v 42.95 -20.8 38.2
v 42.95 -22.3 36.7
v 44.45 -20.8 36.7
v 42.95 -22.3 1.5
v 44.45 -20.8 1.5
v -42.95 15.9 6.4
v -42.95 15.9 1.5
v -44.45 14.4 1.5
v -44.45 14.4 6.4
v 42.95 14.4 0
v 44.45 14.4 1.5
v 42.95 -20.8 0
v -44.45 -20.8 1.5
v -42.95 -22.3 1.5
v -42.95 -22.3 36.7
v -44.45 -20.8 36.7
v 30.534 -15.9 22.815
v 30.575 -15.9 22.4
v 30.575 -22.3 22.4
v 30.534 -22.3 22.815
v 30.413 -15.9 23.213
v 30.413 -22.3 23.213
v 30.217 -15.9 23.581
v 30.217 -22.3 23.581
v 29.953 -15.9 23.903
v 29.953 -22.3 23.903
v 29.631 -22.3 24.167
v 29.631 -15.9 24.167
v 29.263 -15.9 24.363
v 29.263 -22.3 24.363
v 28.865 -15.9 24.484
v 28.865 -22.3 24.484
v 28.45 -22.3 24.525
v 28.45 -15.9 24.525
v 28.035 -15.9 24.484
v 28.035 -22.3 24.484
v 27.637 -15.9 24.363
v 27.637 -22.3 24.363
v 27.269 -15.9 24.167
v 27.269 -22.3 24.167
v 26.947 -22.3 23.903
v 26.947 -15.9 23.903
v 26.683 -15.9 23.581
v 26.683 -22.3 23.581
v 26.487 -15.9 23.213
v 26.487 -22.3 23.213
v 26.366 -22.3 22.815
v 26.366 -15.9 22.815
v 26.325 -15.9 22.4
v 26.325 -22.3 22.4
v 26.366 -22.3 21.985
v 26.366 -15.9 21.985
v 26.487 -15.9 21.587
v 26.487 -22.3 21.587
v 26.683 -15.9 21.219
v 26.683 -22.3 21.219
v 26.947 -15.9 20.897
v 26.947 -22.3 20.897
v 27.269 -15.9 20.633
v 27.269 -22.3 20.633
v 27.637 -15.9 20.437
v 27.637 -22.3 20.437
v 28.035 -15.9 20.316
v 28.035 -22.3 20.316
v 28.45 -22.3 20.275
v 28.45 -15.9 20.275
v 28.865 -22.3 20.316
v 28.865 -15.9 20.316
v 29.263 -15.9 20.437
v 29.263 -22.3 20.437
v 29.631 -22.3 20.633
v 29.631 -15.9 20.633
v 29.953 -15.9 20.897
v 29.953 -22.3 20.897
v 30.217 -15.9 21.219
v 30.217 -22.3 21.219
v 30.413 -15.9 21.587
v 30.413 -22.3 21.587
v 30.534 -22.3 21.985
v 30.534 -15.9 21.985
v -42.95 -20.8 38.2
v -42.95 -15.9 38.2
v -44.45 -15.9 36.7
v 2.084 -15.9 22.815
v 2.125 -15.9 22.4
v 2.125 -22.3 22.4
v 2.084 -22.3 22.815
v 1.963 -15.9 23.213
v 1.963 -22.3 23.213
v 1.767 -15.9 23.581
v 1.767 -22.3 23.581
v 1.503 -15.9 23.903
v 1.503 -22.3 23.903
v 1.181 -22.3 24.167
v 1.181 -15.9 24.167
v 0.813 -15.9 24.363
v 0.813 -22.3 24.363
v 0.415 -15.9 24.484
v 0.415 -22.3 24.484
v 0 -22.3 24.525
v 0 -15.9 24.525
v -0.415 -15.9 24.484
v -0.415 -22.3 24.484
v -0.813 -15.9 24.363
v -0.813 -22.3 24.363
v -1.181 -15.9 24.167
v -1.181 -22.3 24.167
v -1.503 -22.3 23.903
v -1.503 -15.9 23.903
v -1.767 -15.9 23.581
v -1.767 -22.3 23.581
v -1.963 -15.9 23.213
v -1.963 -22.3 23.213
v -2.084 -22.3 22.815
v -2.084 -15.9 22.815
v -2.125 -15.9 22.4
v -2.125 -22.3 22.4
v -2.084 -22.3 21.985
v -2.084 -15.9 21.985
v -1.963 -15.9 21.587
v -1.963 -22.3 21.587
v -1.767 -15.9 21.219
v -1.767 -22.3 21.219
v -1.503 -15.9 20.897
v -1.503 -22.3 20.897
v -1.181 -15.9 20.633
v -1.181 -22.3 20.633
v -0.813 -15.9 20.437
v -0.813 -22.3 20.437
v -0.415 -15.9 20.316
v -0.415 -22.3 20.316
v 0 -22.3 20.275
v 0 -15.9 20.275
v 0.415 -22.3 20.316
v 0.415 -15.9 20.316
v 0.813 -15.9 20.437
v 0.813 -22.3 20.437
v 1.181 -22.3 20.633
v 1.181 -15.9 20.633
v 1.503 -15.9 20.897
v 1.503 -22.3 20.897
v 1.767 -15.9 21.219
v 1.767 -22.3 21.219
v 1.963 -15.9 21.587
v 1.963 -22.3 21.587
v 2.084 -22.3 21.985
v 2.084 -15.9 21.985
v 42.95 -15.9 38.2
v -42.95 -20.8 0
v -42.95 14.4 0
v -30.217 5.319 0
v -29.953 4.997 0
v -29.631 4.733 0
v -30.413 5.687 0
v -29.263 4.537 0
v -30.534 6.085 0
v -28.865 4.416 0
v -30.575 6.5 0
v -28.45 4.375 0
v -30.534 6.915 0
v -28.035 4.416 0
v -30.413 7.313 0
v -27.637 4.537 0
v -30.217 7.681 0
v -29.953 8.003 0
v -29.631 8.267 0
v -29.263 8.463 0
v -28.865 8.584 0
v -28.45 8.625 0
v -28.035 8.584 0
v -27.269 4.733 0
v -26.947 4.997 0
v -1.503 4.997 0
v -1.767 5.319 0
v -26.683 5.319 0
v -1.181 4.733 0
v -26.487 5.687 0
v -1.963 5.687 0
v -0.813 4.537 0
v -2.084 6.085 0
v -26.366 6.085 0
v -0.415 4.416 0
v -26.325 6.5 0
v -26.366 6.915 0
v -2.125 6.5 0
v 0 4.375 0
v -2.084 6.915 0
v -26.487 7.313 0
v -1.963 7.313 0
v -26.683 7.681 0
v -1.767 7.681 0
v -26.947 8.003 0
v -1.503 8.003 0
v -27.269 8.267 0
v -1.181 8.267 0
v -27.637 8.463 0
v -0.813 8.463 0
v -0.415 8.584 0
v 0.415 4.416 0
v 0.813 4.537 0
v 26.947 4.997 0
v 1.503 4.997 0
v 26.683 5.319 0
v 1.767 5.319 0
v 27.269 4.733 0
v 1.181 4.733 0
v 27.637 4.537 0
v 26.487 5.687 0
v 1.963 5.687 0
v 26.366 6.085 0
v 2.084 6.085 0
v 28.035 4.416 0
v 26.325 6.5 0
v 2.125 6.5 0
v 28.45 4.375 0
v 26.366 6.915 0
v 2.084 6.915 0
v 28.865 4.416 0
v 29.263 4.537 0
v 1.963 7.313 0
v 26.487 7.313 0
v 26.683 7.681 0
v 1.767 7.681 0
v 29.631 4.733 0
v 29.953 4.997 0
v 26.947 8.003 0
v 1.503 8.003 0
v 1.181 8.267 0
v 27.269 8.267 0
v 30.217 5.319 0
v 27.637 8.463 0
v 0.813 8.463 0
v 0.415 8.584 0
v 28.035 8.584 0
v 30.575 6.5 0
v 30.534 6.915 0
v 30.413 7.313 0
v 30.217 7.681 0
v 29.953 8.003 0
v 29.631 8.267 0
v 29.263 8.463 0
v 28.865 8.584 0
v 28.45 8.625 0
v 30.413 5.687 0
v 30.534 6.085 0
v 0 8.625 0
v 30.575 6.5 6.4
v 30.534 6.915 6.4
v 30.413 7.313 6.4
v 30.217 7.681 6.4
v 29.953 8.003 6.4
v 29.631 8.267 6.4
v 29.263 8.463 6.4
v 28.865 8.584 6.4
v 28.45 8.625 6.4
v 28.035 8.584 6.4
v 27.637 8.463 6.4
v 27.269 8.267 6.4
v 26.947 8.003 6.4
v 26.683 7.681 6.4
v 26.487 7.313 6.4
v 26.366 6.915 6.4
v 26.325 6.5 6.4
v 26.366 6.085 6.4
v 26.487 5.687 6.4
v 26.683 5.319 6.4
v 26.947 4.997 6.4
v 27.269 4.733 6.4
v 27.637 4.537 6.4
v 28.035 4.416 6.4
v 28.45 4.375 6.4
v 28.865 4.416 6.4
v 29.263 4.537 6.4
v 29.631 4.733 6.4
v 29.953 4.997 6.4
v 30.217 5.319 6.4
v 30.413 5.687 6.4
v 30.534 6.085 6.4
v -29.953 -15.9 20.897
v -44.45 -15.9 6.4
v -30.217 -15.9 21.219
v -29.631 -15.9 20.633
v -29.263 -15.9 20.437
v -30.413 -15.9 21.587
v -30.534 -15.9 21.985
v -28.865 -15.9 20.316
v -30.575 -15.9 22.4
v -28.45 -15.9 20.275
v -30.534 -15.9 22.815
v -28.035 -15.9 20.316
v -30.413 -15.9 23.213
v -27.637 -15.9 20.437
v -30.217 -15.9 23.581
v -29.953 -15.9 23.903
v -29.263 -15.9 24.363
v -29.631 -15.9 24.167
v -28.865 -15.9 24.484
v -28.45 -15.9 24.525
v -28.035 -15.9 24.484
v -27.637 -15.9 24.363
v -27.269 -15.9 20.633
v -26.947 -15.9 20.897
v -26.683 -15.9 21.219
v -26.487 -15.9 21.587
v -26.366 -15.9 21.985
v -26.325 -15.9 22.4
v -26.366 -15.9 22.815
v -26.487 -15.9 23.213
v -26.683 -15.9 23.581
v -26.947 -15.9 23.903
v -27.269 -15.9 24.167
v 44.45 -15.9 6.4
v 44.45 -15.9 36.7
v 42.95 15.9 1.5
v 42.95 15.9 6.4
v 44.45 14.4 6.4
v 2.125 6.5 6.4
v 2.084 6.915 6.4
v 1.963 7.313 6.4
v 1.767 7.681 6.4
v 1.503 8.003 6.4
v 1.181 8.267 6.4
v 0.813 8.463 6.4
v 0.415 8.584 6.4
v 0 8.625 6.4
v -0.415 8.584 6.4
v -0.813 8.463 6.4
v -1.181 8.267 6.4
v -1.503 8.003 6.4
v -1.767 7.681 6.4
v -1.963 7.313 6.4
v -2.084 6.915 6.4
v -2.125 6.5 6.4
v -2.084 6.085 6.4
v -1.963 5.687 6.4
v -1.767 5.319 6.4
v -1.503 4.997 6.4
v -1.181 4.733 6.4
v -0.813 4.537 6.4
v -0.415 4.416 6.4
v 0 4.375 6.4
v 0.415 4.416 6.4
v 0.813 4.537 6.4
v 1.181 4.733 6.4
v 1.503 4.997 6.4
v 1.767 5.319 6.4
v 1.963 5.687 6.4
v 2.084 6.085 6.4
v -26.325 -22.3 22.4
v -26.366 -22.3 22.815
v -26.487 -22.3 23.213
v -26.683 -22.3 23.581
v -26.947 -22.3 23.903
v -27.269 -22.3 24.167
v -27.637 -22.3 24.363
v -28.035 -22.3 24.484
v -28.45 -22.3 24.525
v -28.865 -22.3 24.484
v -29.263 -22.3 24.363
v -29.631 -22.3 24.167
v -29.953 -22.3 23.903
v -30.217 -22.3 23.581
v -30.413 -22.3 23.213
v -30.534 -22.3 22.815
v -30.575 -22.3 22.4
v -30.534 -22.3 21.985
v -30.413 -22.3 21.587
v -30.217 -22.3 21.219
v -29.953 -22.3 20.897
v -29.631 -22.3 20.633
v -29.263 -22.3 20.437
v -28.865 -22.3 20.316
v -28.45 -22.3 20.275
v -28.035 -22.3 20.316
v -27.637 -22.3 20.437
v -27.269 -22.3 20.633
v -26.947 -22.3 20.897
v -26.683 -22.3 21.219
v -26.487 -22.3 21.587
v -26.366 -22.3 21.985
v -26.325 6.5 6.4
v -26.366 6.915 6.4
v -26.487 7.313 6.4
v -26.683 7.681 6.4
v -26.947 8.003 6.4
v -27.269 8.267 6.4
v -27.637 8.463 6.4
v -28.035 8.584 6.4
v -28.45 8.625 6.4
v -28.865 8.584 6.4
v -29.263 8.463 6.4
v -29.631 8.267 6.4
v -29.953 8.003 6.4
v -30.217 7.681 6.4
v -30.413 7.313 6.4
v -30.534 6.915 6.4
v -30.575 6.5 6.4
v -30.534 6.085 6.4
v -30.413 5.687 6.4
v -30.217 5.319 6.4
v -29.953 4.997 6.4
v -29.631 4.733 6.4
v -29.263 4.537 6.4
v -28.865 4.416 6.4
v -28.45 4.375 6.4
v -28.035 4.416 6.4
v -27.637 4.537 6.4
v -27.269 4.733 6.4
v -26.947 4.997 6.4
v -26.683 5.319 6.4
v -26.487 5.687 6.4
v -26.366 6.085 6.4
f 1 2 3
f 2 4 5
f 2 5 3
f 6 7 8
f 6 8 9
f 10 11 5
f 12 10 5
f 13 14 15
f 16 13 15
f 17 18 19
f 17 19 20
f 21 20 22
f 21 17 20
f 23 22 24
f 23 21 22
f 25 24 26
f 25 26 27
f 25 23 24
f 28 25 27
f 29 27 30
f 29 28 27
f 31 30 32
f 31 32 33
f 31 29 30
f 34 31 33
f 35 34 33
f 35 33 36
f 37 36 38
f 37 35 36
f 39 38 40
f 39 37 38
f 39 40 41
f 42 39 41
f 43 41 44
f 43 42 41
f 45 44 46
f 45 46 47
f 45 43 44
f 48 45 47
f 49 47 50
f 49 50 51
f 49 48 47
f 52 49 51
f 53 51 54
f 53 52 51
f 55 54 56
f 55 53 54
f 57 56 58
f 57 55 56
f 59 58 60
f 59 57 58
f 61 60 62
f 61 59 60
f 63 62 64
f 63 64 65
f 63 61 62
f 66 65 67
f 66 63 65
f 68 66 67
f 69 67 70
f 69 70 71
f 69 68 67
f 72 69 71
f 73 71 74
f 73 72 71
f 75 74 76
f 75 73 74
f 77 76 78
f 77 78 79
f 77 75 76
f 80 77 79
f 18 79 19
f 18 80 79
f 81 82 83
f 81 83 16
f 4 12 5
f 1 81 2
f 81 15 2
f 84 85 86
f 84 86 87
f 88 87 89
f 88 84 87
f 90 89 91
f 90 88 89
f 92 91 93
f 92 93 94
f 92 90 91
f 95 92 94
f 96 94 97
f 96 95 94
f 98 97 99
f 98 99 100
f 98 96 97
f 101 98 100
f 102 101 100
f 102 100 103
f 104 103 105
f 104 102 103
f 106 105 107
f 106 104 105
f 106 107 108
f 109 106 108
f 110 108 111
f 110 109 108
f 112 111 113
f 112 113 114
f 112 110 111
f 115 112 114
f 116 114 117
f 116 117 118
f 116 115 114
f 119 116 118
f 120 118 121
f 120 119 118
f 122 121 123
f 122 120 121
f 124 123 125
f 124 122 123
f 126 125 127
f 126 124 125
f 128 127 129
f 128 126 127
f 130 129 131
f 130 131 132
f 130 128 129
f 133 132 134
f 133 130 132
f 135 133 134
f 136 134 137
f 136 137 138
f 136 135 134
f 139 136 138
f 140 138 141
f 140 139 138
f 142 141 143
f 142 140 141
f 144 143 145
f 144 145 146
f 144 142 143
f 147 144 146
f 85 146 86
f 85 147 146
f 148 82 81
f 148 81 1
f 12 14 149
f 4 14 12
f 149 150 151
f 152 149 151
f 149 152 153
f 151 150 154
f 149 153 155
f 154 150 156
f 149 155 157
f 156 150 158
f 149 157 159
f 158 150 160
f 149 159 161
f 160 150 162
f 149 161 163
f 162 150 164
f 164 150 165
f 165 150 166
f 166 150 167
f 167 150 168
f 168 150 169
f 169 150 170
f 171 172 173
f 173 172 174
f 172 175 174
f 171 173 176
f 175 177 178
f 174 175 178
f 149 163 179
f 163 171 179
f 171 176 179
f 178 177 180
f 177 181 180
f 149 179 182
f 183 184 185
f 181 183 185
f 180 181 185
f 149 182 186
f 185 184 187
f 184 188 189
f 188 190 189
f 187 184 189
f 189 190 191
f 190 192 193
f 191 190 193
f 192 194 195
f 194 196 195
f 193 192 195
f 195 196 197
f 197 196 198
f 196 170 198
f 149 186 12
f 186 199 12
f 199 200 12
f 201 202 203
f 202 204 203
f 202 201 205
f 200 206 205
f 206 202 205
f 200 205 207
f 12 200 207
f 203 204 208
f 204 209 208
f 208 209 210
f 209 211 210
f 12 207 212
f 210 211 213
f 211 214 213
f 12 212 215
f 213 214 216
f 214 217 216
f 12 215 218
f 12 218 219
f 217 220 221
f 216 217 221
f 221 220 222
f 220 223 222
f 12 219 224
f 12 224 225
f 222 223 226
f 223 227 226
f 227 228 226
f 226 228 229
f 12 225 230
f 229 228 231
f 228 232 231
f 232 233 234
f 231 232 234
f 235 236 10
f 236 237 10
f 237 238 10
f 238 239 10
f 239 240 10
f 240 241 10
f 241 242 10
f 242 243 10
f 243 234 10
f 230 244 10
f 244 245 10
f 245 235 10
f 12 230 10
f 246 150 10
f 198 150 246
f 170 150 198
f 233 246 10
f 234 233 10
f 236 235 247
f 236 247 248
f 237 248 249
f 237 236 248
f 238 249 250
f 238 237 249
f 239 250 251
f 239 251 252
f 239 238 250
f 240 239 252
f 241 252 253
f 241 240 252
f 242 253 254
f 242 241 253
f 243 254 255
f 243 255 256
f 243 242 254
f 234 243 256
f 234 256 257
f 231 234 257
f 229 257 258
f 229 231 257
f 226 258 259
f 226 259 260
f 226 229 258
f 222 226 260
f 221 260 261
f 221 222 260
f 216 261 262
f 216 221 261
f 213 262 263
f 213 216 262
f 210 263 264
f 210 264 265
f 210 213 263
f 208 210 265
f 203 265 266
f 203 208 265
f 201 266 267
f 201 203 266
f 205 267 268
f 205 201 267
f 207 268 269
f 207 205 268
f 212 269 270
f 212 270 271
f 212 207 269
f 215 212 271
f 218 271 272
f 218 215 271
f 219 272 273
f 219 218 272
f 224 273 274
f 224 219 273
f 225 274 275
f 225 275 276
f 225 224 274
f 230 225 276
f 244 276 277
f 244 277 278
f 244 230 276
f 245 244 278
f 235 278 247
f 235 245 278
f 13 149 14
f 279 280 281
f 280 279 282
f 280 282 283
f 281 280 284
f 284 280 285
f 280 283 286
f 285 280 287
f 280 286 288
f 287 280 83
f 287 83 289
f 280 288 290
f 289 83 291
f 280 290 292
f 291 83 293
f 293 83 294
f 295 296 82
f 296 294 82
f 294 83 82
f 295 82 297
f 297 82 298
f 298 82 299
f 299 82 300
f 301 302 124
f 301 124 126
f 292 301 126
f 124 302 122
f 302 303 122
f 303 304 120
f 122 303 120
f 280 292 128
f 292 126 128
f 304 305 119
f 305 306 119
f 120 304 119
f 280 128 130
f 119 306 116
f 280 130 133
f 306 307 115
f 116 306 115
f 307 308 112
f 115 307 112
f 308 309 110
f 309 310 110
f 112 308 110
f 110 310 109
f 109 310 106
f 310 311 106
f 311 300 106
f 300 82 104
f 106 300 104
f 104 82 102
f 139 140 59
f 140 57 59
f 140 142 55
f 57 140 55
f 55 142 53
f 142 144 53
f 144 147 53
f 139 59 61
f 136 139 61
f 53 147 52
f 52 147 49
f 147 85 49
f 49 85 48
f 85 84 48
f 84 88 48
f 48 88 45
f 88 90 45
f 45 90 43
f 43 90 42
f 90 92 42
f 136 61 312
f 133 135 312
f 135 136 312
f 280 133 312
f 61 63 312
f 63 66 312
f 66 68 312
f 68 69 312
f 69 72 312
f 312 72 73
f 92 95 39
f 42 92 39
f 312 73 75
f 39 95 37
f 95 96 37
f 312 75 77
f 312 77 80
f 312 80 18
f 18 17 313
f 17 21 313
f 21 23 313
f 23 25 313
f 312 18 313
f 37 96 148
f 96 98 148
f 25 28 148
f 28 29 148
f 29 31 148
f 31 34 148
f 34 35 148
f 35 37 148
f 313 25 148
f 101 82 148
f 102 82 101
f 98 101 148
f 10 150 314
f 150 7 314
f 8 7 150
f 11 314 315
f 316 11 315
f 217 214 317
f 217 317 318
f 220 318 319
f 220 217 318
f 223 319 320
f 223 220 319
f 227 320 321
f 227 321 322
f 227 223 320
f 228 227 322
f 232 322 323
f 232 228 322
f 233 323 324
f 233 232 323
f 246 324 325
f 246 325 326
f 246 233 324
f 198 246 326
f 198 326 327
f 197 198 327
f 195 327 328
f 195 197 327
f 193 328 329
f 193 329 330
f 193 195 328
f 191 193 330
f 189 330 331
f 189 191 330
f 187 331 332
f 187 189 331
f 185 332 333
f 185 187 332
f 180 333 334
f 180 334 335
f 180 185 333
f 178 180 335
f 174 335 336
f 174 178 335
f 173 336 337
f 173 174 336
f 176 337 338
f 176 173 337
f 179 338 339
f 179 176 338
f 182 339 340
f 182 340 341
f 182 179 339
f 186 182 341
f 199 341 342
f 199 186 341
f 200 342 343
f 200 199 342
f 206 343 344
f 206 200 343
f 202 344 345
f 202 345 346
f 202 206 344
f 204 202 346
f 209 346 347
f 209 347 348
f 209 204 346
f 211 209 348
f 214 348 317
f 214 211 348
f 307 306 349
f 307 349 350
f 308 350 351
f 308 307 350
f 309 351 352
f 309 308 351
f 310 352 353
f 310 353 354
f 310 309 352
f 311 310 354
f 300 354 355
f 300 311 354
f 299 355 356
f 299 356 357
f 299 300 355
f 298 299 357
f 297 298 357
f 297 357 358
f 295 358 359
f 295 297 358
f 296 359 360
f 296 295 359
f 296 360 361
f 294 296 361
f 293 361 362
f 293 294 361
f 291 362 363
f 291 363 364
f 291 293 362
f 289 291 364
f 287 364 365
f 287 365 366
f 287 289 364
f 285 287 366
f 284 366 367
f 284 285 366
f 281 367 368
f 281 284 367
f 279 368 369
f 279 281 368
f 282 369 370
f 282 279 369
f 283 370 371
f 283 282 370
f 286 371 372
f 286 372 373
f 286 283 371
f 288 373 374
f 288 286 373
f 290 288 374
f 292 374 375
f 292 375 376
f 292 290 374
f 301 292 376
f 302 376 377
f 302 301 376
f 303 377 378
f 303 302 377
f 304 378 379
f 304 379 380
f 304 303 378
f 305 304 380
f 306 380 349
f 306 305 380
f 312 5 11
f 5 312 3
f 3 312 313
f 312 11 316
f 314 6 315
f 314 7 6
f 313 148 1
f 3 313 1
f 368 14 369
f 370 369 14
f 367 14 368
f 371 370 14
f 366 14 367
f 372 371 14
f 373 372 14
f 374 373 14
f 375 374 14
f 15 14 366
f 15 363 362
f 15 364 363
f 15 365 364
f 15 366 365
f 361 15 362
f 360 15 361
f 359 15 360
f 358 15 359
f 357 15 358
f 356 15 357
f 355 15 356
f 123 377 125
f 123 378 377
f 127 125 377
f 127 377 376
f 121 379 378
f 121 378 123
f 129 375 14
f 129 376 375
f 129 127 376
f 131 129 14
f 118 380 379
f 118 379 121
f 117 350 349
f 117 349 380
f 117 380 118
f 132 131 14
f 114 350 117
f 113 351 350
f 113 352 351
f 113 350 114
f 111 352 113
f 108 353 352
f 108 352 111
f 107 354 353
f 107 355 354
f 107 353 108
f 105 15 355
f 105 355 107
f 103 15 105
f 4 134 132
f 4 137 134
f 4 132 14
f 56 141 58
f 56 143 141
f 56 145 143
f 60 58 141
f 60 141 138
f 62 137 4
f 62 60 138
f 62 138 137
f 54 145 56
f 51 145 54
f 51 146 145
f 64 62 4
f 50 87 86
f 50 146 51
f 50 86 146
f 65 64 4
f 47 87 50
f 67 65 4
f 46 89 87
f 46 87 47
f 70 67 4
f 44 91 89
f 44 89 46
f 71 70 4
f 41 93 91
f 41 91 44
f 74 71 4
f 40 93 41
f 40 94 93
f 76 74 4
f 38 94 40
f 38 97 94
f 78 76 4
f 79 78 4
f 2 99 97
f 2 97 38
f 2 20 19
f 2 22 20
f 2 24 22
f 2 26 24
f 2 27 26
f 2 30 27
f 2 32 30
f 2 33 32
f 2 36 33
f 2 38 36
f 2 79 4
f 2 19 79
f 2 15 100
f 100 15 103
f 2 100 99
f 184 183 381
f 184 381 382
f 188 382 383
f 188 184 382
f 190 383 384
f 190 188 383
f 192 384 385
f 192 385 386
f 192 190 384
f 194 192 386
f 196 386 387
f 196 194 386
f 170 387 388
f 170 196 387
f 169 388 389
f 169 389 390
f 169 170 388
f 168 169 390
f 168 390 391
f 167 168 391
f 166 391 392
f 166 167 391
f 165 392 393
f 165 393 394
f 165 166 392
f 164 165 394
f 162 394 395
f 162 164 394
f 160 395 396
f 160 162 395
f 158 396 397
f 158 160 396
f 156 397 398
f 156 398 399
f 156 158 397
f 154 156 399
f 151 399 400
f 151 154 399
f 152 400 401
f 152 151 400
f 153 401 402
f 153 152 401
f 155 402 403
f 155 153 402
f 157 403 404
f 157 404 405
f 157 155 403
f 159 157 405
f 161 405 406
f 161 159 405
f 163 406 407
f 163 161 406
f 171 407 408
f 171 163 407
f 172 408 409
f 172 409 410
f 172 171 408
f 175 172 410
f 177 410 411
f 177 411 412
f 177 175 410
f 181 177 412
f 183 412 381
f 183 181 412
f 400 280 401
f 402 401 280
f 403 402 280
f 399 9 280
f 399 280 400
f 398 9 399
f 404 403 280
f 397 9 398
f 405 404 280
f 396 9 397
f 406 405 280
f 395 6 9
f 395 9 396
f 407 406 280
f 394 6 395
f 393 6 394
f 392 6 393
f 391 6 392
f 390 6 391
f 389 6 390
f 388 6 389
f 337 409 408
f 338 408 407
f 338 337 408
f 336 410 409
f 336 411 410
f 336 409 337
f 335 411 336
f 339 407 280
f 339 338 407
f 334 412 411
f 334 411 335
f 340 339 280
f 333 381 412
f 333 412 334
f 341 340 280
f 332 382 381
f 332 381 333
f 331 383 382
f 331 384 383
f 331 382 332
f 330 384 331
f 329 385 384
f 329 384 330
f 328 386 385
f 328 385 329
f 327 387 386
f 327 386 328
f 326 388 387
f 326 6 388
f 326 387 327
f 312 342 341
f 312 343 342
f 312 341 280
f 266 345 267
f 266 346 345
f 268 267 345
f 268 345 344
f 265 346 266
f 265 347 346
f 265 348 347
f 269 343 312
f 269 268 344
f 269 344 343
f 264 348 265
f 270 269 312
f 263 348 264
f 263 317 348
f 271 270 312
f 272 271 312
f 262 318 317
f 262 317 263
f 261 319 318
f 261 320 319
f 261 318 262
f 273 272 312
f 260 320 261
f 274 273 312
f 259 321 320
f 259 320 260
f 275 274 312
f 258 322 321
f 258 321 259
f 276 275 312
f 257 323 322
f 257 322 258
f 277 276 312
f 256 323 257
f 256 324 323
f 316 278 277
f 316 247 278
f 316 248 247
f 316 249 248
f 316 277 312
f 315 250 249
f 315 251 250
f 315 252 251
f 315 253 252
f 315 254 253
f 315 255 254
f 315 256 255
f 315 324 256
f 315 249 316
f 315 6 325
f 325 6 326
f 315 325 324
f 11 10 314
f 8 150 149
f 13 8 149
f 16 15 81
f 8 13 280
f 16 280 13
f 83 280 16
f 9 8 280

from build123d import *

# Parameters (mm, degrees)
F0_W     = 88.9
F0_H     = 31.8
F0_R     = 2.125
F1_DEPTH = 6.4
F2_W     = 88.9
F2_H     = 38.2
F2_R     = 2.125
F3_DEPTH = 6.4
F4_SIZE  = 1.5


with BuildPart() as f1:
    # F0 (on Top) → F1 (new body)
    with BuildSketch(Plane.XY):
        Rectangle(F0_W, F0_H)
        with Locations((-28.45, 6.5)):
            Circle(F0_R, mode=Mode.SUBTRACT)
        with Locations((0, 6.5)):
            Circle(F0_R, mode=Mode.SUBTRACT)
        with Locations((28.45, 6.5)):
            Circle(F0_R, mode=Mode.SUBTRACT)
    extrude(amount=F1_DEPTH)

    # F2 (on face) → F3 (join)
    with BuildSketch(Plane.XZ.offset(15.9)):
        with Locations((0, 19.1)):
            Rectangle(F2_W, F2_H)
        with Locations((-28.45, 22.4)):
            Circle(F2_R, mode=Mode.SUBTRACT)
        with Locations((0, 22.4)):
            Circle(F2_R, mode=Mode.SUBTRACT)
        with Locations((28.45, 22.4)):
            Circle(F2_R, mode=Mode.SUBTRACT)
    extrude(amount=F3_DEPTH)

    # F4
    f4_edges = [f1.edges().sort_by_distance(p)[0] for p in [
        (0, -22.3, 38.2),
        (0, -22.3, 0),
        (0, 15.9, 0),
        (44.45, -3.2, 0),
        (44.45, 15.9, 3.2),
        (-44.45, 15.9, 3.2),
        (-44.45, -3.2, 0),
        (-44.45, -22.3, 19.1),
        (44.45, -22.3, 19.1),
        (-44.45, -19.1, 38.2),
        (44.45, -19.1, 38.2),
    ]]
    chamfer(f4_edges, length=F4_SIZE)


solid = f1.part
